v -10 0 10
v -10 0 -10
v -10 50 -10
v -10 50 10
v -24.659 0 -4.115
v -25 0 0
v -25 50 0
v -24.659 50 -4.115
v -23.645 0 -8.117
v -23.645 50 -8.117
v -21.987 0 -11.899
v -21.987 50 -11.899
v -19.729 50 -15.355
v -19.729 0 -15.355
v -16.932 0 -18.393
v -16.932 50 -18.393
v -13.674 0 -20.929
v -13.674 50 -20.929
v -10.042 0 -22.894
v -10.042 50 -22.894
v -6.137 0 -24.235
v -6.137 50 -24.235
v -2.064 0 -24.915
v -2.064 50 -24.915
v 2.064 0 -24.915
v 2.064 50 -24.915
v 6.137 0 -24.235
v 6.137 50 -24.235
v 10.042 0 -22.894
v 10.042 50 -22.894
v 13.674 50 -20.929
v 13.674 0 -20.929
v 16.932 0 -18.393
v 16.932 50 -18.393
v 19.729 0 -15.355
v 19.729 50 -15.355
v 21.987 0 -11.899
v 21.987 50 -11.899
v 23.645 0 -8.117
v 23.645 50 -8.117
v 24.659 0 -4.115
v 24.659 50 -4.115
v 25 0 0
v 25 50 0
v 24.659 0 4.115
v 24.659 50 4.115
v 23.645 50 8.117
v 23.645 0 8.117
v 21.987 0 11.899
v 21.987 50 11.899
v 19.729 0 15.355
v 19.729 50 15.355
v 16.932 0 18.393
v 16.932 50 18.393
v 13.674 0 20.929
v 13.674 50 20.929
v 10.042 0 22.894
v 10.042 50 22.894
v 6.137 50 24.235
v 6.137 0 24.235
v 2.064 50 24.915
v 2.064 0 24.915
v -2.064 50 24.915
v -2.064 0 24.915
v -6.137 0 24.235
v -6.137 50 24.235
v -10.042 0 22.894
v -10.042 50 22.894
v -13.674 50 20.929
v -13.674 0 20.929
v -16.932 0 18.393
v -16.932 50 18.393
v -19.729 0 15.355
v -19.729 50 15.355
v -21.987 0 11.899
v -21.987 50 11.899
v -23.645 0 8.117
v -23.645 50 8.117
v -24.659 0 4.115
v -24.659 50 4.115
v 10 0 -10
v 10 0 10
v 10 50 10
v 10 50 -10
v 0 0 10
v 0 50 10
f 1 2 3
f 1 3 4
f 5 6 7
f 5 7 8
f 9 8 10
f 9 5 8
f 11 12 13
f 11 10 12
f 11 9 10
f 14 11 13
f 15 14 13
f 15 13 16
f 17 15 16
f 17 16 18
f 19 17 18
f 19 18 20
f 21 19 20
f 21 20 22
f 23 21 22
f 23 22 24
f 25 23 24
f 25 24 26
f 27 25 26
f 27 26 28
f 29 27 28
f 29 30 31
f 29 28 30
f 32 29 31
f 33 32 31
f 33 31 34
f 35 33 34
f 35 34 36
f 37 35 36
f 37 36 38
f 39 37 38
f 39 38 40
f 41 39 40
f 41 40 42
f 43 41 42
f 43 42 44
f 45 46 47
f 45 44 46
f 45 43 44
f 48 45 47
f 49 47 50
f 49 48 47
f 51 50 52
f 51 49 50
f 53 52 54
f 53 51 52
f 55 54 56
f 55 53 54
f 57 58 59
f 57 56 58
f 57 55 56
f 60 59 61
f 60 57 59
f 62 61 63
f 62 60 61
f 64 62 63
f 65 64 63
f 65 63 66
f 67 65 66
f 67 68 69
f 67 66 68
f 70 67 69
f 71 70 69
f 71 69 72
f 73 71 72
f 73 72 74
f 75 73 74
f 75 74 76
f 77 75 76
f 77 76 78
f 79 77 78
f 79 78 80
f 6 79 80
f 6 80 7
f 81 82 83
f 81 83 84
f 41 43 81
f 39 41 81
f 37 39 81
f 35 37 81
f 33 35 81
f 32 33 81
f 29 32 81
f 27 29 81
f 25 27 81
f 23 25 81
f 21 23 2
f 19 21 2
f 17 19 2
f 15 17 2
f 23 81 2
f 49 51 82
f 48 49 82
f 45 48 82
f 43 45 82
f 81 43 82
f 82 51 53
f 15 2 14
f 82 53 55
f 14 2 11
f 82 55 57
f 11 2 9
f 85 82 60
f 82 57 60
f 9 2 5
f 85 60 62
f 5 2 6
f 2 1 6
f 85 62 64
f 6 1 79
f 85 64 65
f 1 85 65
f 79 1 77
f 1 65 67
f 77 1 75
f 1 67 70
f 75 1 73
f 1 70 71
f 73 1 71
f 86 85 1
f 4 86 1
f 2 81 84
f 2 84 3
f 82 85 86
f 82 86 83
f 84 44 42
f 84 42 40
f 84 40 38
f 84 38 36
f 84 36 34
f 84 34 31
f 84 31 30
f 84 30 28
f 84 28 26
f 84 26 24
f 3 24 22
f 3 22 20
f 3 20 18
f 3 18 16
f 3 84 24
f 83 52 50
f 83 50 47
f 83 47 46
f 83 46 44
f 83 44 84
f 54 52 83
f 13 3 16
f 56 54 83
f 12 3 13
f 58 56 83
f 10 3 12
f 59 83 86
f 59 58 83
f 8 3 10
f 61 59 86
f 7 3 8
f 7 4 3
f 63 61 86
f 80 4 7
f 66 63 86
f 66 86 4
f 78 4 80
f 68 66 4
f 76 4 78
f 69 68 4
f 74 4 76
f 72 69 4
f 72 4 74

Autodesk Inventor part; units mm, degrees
ref_plane "YZ Plane" through (0, 0, 0) normal (1, 0, 0) x (0, 1, 0)
ref_plane "XZ Plane" through (0, 0, 0) normal (0, 1, 0) x (-1, 0, 0)
ref_plane "XY Plane" through (0, 0, 0) normal (0, 0, 1) x (1, 0, 0)
sketch "Sketch1" plane through (0, 0, 0) normal (0, 1, 0) x (-1, 0, 0)
  circle A0 centre (0, 0) radius 25
  line L0 (0, 0) -> (0, 10)
  line L1 (0, 10) -> (10, 10)
  line L2 (10, 10) -> (-10, 10)
  line L3 (-10, 10) -> (-10, -10)
  line L4 (-10, -10) -> (10, -10)
  line L5 (10, -10) -> (10, 10)
  dimension "d0" = 50
  dimension "d1" = 10
  dimension "d2" = 10
  dimension "d3" = 20
  dimension "d4" = 20
extrude "Extrusion1" add sketch "Sketch1" along normal blind 50
properties part number "base"
